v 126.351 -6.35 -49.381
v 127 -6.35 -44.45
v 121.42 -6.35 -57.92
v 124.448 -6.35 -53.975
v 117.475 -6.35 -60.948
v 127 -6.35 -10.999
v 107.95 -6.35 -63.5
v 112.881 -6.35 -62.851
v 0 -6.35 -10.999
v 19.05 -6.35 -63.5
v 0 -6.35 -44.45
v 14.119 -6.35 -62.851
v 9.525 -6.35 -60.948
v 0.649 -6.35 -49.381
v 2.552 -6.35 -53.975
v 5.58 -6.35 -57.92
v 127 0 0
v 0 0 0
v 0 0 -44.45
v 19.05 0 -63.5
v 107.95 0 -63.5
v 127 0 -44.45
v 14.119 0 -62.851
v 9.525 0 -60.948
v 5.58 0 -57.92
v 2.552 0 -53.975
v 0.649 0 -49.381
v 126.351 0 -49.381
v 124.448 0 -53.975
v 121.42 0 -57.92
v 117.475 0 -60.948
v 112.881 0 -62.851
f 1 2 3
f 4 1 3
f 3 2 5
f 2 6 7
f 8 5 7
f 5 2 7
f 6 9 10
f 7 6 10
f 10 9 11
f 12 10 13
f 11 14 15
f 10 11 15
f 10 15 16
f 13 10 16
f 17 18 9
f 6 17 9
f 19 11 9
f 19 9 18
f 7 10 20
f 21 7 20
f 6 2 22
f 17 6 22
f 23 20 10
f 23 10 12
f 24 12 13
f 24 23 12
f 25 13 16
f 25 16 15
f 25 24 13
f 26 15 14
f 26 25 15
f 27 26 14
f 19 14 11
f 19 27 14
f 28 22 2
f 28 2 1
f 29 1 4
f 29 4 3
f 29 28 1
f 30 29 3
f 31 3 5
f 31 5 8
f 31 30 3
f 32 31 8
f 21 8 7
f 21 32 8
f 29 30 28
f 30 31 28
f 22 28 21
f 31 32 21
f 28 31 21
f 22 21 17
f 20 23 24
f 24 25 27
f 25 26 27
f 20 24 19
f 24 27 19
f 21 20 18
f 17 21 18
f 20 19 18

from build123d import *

# Parameters (mm, degrees)
F1_DEPTH = 127
F3_DEPTH = 7.366


with BuildPart() as f1:
    # F0 (on Right) → F1 (new body)
    with BuildSketch(Plane.YZ):
        Polygon((0, -63.5), (0, 0), (-6.35, -10.998523), (-6.35, -63.5), align=None)
    extrude(amount=F1_DEPTH)

    # F2 (on Front) → F3 (cut)
    with BuildSketch(Plane.XZ):
        with BuildLine():
            Line((0, -44.45), (0, -33.842908))
            Line((0, -33.842908), (-28.897969, -33.245133))
            Line((-28.897969, -33.245133), (-28.897969, -77.647364))
            Line((-28.897969, -77.647364), (46.444243, -77.647364))
            Line((46.444243, -77.647364), (44.850173, -63.5))
            Line((44.850173, -63.5), (19.05, -63.5))
            ThreePointArc((19.05, -63.5), (5.579616, -57.920384), (0, -44.45))
        make_face()
        with BuildLine():
            Line((143.538471, -31.044858), (127, -30.048563))
            Line((127, -30.048563), (127, -44.45))
            ThreePointArc((127, -44.45), (121.420384, -57.920384), (107.95, -63.5))
            Line((107.95, -63.5), (99.701572, -63.5))
            Line((99.701572, -63.5), (99.701572, -83.425855))
            Line((99.701572, -83.425855), (143.538471, -83.425855))
            Line((143.538471, -83.425855), (143.538471, -31.044858))
        make_face()
    extrude(amount=F3_DEPTH, mode=Mode.SUBTRACT)


solid = f1.part
